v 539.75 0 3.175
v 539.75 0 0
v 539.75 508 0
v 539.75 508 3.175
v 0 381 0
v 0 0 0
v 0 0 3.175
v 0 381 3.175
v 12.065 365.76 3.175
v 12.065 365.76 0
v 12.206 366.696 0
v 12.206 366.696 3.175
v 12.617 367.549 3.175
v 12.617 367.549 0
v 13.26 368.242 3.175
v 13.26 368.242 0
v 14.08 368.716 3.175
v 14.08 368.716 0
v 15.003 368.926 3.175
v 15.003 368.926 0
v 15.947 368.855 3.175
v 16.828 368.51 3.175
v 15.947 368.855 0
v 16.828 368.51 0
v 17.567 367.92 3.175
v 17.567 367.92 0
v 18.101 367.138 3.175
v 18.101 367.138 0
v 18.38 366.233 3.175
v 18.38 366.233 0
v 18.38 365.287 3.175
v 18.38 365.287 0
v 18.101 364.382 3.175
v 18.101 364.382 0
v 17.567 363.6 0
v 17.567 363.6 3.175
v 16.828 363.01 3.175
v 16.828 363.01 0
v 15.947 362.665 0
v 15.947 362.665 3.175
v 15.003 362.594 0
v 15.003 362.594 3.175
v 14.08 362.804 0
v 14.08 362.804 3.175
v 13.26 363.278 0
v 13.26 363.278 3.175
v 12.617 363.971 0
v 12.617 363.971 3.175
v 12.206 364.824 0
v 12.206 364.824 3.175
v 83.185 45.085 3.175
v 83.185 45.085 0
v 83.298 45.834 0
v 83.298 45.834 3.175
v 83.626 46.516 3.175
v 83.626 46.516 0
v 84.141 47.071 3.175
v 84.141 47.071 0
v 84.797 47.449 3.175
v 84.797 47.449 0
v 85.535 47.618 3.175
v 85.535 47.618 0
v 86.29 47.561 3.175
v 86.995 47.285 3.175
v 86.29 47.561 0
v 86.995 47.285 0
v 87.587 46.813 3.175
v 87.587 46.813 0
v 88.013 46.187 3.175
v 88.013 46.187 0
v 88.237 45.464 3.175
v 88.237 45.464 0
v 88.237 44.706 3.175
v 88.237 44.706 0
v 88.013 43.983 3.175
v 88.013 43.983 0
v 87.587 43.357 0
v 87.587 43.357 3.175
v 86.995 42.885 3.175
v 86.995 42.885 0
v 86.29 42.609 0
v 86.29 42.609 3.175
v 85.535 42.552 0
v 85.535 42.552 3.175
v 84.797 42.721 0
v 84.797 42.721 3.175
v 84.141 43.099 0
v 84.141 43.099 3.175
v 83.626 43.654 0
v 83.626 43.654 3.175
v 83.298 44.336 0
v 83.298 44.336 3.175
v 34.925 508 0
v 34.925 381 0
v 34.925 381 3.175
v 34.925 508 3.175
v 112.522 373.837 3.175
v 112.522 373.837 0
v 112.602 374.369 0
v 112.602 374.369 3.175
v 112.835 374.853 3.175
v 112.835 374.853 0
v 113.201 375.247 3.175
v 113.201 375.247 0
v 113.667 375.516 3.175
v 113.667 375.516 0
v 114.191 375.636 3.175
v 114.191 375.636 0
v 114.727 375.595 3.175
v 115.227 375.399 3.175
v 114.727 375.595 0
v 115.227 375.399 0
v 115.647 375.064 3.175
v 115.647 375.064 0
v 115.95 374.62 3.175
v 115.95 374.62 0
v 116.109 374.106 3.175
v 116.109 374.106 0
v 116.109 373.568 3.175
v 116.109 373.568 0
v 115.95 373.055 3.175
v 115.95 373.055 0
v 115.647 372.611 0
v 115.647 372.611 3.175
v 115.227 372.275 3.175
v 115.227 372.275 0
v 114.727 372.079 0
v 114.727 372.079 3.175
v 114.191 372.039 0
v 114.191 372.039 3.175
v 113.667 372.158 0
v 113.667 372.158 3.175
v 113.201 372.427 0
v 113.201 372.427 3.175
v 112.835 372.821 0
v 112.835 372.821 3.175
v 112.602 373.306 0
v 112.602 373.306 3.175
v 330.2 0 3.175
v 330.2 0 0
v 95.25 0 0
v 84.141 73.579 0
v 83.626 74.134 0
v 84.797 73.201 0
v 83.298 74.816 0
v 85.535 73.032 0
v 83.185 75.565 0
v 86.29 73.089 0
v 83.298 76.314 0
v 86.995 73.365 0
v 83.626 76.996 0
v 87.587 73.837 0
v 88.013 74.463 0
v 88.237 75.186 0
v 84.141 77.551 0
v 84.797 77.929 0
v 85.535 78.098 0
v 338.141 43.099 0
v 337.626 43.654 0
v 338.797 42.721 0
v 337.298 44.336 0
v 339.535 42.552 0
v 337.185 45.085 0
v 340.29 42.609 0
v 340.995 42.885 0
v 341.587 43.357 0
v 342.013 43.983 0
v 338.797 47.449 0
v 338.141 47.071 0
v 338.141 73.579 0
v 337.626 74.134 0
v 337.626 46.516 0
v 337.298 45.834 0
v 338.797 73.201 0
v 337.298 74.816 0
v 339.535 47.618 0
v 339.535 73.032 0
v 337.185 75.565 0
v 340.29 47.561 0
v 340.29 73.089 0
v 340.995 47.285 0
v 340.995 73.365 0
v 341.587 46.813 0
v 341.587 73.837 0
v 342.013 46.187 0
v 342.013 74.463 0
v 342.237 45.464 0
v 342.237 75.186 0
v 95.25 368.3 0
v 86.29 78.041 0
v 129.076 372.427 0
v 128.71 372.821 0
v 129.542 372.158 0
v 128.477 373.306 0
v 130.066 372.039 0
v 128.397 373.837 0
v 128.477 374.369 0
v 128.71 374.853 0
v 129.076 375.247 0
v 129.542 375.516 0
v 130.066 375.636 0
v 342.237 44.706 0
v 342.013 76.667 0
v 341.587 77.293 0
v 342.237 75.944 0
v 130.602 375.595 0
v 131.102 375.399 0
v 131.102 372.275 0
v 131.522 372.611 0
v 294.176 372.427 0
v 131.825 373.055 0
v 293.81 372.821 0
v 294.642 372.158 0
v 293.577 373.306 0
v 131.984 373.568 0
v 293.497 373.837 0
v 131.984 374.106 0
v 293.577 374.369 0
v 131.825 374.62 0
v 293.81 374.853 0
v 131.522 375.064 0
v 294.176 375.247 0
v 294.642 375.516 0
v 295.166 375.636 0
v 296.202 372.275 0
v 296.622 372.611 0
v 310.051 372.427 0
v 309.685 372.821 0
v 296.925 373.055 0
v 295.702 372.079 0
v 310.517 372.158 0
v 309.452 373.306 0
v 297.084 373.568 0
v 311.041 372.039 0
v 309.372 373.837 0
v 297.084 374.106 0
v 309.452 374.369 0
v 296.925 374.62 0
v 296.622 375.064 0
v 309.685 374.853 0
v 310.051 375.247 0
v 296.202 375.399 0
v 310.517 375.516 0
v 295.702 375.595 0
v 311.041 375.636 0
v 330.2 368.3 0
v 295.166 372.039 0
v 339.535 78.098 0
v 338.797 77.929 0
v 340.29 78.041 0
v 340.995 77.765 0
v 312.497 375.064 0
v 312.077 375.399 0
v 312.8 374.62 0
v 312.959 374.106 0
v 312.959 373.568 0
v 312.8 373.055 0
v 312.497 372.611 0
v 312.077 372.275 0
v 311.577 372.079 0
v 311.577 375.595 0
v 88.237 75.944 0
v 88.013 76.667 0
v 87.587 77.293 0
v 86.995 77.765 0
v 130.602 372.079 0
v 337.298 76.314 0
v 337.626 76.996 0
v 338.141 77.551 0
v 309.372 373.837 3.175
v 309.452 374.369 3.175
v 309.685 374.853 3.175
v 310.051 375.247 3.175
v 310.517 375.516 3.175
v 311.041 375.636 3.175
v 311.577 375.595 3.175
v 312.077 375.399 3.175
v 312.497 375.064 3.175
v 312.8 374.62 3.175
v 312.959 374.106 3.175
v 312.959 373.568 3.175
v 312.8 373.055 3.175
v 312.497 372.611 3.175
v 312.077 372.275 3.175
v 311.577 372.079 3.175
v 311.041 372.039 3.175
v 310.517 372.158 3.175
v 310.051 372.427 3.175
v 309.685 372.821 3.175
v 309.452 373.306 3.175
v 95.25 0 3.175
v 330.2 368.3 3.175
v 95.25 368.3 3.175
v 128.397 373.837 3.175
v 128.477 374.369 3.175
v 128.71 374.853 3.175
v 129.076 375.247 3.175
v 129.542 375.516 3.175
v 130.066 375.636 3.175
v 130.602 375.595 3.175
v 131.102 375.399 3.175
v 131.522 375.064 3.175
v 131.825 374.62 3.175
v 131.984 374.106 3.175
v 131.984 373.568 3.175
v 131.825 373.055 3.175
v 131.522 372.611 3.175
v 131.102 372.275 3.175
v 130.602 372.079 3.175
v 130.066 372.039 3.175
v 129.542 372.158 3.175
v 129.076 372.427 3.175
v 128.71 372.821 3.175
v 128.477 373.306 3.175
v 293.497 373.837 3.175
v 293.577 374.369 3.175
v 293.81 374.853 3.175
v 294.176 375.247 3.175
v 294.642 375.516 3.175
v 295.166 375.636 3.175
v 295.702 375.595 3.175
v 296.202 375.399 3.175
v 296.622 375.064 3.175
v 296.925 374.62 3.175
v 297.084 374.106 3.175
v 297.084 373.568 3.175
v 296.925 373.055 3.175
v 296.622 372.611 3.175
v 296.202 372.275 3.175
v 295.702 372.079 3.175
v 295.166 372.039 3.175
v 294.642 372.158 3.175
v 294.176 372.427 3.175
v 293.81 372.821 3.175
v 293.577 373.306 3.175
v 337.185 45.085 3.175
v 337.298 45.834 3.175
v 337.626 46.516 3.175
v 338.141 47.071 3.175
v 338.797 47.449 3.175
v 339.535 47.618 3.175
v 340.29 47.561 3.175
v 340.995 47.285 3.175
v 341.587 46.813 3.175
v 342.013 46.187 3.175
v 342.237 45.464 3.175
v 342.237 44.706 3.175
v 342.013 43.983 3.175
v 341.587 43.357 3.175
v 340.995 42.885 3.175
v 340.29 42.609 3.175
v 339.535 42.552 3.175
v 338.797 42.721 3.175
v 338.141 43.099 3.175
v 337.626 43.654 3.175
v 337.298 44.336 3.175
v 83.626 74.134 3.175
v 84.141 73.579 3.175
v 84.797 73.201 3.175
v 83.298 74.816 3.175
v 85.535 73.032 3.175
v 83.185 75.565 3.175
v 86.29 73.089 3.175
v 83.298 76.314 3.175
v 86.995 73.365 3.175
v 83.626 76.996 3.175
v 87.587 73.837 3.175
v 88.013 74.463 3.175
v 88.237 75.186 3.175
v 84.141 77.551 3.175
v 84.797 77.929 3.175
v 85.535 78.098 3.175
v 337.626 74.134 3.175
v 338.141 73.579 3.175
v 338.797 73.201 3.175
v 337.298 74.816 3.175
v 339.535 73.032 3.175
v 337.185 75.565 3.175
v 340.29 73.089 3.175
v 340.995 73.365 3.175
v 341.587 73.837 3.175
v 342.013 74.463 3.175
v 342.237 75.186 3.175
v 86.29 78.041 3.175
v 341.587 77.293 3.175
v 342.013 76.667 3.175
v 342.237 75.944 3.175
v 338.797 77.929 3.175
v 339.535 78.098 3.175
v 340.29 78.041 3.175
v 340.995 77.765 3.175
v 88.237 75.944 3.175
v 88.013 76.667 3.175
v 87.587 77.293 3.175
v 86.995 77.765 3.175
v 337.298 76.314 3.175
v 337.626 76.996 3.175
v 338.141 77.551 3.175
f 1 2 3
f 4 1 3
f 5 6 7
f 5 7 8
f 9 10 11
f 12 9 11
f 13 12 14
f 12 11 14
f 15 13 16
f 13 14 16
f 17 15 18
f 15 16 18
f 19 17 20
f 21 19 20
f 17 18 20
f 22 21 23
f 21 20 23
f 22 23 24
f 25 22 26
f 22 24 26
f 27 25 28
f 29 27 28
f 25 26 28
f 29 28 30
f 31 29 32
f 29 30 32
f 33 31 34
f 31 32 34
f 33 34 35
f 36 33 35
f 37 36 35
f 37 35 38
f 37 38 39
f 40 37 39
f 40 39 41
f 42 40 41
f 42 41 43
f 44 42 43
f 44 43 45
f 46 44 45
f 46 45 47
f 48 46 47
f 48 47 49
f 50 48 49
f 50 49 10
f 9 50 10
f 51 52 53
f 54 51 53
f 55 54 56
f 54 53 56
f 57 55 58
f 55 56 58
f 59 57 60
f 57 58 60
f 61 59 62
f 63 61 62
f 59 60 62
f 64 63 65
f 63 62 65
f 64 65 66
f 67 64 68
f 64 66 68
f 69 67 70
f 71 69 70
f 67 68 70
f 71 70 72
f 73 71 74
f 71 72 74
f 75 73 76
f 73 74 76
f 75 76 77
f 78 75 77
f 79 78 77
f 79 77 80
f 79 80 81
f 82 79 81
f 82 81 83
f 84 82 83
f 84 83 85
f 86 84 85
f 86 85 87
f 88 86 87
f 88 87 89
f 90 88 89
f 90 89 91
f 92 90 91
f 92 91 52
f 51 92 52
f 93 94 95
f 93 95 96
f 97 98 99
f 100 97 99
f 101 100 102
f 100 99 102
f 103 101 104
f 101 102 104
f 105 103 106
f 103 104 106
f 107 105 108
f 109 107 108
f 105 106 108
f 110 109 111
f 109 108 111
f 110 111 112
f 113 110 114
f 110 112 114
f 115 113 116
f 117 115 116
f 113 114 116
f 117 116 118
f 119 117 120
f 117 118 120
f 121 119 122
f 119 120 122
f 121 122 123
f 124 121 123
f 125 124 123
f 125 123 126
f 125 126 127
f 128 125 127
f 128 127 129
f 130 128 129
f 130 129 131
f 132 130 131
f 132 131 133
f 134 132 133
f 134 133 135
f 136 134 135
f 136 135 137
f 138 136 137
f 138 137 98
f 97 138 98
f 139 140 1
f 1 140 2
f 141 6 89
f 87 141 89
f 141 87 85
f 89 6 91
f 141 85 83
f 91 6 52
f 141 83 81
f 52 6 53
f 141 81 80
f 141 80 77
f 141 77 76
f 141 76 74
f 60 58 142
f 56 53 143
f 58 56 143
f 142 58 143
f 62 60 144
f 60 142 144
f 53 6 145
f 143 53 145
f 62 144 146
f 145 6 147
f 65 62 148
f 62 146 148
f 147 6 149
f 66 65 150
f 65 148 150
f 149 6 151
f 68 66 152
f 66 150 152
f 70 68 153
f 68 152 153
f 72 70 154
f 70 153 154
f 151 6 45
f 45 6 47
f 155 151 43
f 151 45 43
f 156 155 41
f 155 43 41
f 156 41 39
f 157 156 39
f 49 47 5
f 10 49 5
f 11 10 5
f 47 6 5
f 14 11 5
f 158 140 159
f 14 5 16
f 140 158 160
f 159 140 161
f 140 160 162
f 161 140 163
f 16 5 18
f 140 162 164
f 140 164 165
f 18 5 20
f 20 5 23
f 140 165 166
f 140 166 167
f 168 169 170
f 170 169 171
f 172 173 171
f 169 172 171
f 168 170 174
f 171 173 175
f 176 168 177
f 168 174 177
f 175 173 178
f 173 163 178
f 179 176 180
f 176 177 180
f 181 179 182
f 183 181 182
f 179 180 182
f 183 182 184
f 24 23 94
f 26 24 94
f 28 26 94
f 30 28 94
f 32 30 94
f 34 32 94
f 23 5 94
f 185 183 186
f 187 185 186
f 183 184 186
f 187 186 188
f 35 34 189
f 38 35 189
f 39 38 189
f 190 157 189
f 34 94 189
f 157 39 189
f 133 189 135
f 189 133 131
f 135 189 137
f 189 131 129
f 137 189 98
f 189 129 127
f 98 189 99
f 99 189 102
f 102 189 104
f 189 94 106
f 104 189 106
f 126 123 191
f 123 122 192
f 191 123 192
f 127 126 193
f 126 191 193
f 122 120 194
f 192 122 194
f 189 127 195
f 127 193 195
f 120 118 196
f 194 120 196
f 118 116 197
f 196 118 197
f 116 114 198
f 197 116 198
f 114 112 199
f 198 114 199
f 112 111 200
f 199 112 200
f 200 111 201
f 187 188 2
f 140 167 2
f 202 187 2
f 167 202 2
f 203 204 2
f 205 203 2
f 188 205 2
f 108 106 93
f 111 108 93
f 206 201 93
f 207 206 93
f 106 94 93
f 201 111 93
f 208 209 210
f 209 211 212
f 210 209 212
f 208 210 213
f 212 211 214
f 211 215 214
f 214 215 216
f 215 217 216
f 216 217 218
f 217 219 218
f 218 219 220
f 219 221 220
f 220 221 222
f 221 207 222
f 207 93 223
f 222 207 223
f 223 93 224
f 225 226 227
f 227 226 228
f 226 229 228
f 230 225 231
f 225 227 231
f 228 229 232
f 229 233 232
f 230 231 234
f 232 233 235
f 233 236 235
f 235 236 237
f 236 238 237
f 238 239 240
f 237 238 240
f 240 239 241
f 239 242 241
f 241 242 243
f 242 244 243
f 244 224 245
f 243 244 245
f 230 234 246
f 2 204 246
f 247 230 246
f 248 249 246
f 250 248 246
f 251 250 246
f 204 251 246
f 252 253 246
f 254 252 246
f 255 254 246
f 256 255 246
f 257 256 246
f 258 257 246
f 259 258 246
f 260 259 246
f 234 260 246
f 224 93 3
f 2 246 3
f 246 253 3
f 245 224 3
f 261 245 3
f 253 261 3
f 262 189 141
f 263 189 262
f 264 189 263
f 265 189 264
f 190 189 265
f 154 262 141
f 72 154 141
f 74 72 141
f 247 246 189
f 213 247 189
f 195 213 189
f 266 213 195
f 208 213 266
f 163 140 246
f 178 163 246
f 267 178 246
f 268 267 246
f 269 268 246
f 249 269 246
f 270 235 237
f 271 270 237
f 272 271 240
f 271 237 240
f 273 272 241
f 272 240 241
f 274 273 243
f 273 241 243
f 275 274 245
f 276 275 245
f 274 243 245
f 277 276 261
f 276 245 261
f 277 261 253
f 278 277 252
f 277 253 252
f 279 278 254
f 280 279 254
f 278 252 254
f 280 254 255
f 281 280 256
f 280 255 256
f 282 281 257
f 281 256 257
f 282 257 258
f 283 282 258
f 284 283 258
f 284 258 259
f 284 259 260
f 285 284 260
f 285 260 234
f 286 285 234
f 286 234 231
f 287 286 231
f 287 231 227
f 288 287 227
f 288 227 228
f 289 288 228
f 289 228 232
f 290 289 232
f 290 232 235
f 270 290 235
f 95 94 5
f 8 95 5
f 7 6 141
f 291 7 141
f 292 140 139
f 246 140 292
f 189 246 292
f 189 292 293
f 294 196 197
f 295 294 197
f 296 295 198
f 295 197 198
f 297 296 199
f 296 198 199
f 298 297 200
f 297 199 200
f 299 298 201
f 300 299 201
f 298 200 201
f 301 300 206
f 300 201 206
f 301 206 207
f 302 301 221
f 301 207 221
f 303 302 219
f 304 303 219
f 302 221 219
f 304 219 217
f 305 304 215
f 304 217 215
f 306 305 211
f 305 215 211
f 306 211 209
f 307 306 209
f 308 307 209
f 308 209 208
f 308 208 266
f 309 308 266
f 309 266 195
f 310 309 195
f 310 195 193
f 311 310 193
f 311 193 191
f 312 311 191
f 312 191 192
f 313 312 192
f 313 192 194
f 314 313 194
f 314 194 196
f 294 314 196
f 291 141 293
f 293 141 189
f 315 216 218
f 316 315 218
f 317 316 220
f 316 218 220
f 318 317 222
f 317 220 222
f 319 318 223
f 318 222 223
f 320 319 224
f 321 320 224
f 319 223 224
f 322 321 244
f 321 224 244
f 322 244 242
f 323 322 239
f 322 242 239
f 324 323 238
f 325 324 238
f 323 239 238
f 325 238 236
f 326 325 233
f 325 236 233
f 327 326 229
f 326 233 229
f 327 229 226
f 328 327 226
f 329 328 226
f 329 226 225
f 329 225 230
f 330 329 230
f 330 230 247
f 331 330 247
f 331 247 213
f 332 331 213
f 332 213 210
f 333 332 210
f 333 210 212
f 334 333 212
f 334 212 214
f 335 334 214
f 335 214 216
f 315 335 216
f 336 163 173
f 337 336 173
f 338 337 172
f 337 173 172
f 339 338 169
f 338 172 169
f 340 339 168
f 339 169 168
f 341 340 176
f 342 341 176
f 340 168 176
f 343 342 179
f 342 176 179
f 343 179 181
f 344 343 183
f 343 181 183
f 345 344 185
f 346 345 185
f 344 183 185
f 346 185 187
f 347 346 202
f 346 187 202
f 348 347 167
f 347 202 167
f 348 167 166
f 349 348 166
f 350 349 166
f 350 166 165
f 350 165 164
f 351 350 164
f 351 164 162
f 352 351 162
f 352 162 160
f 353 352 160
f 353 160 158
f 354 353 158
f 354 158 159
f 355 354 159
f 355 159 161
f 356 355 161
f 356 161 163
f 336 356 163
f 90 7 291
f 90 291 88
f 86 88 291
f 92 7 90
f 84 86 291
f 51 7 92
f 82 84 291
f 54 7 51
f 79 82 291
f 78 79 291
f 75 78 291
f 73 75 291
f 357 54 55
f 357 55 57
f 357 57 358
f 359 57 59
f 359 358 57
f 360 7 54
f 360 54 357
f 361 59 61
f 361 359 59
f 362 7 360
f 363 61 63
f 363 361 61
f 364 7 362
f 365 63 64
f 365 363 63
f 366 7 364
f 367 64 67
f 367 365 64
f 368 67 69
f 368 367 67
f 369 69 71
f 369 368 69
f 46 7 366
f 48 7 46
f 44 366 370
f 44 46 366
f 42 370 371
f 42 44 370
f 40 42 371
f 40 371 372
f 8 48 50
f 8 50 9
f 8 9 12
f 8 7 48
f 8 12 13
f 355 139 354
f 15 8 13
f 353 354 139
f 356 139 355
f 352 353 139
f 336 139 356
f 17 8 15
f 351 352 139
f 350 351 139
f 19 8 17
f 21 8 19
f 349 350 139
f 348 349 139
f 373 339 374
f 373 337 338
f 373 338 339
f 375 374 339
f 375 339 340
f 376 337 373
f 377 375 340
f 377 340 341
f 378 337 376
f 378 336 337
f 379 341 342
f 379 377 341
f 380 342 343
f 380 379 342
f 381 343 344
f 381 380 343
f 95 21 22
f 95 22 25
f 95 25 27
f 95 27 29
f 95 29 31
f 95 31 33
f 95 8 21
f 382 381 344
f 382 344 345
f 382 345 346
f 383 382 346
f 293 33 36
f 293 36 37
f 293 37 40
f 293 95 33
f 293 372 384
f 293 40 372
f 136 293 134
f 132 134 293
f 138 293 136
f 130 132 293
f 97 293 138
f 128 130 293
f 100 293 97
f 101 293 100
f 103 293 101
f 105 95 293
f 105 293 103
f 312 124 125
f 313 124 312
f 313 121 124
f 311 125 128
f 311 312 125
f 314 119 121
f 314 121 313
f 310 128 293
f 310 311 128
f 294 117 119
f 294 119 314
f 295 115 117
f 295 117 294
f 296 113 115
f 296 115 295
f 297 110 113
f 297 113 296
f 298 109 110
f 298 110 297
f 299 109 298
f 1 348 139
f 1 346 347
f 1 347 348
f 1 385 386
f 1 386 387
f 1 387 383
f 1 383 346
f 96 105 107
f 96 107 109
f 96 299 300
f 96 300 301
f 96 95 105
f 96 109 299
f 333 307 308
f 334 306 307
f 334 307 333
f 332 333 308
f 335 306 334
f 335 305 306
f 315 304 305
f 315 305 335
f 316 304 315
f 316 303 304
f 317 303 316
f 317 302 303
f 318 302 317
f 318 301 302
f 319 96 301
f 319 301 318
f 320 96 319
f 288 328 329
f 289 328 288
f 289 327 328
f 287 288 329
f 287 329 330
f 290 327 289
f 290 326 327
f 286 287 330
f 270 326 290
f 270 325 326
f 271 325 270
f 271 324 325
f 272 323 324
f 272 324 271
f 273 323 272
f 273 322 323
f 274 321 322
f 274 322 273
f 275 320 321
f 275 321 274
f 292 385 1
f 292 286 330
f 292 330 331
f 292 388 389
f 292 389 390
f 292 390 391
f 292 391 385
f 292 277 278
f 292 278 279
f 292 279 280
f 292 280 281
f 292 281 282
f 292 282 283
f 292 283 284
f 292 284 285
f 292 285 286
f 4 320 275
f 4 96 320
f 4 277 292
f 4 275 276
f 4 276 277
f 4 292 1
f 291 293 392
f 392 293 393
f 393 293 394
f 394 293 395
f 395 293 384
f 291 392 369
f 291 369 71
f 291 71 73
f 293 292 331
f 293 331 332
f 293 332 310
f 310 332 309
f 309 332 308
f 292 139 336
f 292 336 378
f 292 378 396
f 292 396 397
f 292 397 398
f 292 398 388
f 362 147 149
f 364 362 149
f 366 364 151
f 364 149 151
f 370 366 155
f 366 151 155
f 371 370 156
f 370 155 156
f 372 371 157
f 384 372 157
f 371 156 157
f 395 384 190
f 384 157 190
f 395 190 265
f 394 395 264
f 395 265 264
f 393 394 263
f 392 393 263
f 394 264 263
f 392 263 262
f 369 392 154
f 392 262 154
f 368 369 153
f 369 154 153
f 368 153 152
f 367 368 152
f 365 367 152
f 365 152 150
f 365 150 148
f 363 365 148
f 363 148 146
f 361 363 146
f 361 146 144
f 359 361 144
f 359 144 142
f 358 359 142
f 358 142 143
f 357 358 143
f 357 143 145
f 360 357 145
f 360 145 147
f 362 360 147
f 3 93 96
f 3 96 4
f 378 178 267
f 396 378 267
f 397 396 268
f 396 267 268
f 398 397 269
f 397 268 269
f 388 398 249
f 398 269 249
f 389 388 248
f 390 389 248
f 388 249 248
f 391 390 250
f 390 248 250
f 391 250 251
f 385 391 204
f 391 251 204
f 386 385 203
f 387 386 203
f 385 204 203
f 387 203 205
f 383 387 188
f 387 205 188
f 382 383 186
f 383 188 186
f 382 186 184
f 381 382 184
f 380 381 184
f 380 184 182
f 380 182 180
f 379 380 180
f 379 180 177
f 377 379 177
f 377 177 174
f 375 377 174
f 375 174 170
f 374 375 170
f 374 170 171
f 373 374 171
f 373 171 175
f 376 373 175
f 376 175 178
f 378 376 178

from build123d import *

# Parameters (mm, degrees)
SKETCH1_W           = 539.75
SKETCH1_H           = 508
BOSS_EXTRUDE1_DEPTH = 3.175
SKETCH2_R           = 2.54
SKETCH2_R_2         = 3.175
SKETCH2_W           = 234.95
SKETCH2_H           = 368.3
CUT_EXTRUDE1_DEPTH  = 44.45
SKETCH3_W           = 34.925
SKETCH3_H           = 127
CUT_EXTRUDE2_DEPTH  = 742.218013222
SKETCH4_R           = 1.8034
CUT_EXTRUDE3_DEPTH  = 742.218013222


with BuildPart() as part:
    # Sketch1 → Boss-Extrude1 (new body)
    with BuildSketch(Plane.XY):
        with Locations((269.875, 254)):
            Rectangle(SKETCH1_W, SKETCH1_H)
    extrude(amount=BOSS_EXTRUDE1_DEPTH)

    # Sketch2 → Cut-Extrude1 (cut)
    with BuildSketch(Plane(origin=(0, 0, 0), x_dir=(-1, 0, 0), z_dir=(0, 0, -1))):
        with Locations((-339.725, 45.085)):
            Circle(SKETCH2_R)
        with Locations((-85.725, 45.085)):
            Circle(SKETCH2_R)
        with Locations((-15.24, 365.76)):
            Circle(SKETCH2_R_2)
        with Locations((-339.725, 75.565)):
            Circle(SKETCH2_R)
        with Locations((-85.725, 75.565)):
            Circle(SKETCH2_R)
        with Locations((-212.725, 184.15)):
            Rectangle(SKETCH2_W, SKETCH2_H)
    extrude(amount=-CUT_EXTRUDE1_DEPTH, mode=Mode.SUBTRACT)

    # Sketch3 → Cut-Extrude2 (cut, through all)
    with BuildSketch(Plane(origin=(0, 0, 0), x_dir=(-1, 0, 0), z_dir=(0, 0, -1))):
        with Locations((-17.4625, 444.5)):
            Rectangle(SKETCH3_W, SKETCH3_H)
    extrude(amount=-CUT_EXTRUDE2_DEPTH, mode=Mode.SUBTRACT)

    # Sketch4 → Cut-Extrude3 (cut, through all)
    with BuildSketch(Plane(origin=(0, 0, 0), x_dir=(-1, 0, 0), z_dir=(0, 0, -1))):
        with Locations((-311.1754, 373.8372)):
            Circle(SKETCH4_R)
        with Locations((-295.3004, 373.8372)):
            Circle(SKETCH4_R)
        with Locations((-130.2004, 373.8372)):
            Circle(SKETCH4_R)
        with Locations((-114.3254, 373.8372)):
            Circle(SKETCH4_R)
    extrude(amount=-CUT_EXTRUDE3_DEPTH, mode=Mode.SUBTRACT)


solid = part.part
